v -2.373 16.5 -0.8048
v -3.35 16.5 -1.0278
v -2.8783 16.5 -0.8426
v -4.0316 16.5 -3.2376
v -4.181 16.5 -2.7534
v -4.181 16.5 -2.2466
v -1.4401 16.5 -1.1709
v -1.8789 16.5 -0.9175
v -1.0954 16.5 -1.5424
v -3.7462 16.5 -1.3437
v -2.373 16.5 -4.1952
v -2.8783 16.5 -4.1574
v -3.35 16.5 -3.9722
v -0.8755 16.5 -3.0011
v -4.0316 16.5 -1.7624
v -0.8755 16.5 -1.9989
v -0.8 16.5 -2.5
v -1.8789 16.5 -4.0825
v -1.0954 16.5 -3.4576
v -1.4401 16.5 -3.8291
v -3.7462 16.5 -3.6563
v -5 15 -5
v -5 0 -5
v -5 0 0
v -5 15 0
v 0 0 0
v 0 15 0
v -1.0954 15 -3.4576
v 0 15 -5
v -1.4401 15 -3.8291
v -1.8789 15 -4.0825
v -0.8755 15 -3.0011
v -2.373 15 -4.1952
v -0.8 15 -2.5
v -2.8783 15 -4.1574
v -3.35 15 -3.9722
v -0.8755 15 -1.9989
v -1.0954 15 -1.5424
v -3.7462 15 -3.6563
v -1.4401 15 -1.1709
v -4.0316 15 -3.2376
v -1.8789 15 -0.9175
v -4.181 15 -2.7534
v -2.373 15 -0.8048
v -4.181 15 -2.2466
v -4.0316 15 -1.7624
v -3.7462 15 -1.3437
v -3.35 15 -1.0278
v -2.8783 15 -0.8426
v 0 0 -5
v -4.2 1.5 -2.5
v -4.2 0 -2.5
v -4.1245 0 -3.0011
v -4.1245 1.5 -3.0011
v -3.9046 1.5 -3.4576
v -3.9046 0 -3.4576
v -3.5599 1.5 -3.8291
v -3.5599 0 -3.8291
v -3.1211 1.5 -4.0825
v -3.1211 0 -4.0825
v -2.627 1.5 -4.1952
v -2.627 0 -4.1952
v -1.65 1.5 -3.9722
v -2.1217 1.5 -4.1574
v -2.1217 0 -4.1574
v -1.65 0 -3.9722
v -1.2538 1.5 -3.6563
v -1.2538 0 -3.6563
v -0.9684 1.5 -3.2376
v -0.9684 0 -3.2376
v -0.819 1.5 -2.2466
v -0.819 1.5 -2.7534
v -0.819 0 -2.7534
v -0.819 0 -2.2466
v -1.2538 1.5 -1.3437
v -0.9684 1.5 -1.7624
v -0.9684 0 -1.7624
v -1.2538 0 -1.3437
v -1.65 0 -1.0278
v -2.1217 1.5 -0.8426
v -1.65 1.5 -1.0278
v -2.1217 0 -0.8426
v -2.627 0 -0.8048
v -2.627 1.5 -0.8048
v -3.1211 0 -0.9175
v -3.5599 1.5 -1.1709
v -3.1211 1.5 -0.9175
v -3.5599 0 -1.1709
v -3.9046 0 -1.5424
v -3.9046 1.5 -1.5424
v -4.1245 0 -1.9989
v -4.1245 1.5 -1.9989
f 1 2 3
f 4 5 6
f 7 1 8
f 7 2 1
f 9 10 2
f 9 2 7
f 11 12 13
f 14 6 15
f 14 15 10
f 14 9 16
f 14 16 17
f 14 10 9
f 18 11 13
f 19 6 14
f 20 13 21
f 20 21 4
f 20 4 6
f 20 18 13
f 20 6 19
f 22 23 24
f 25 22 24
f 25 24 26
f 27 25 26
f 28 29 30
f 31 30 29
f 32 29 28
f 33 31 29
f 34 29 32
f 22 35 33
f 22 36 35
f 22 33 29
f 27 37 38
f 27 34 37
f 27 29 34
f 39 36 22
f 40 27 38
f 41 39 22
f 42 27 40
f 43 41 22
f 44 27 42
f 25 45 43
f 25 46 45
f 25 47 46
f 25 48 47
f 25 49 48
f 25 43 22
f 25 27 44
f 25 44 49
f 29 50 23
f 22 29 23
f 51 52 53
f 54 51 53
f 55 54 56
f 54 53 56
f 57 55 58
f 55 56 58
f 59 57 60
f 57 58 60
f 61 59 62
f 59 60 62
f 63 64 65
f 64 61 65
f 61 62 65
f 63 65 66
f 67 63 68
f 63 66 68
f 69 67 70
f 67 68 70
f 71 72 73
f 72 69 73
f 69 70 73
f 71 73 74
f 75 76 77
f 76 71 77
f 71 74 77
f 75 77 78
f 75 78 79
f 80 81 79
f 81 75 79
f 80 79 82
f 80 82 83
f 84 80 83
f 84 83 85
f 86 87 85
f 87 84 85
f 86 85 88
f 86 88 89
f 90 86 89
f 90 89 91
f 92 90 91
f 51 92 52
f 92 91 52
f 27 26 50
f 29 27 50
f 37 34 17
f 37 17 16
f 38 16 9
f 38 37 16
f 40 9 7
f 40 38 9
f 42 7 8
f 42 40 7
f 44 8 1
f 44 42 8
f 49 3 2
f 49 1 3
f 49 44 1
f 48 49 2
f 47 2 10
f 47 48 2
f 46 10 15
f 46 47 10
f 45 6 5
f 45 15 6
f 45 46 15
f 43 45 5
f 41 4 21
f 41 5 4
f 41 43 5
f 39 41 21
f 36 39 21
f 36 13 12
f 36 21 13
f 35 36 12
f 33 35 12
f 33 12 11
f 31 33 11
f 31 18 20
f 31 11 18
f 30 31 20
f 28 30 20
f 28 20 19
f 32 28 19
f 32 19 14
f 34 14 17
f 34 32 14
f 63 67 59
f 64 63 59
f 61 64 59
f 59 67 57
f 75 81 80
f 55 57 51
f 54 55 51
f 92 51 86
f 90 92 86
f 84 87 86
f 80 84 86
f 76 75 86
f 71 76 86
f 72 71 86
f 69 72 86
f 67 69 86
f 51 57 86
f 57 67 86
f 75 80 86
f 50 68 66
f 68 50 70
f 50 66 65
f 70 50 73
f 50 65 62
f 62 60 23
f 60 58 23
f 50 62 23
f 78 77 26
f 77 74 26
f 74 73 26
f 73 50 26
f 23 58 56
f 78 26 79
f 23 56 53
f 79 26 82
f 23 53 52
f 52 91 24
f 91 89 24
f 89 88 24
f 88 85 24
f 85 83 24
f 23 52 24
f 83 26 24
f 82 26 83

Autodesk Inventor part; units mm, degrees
ref_plane "YZ Plane" through (0, 0, 0) normal (1, 0, 0) x (0, 1, 0)
ref_plane "XZ Plane" through (0, 0, 0) normal (0, 1, 0) x (-1, 0, 0)
ref_plane "XY Plane" through (0, 0, 0) normal (0, 0, 1) x (1, 0, 0)
sketch "草圖1" plane through (0, 0, 0) normal (0, 1, 0) x (-1, 0, 0)
  line L0 (5, 0) -> (0, 0)
  line L1 (0, 0) -> (0, -5)
  line L2 (0, -5) -> (5, -5)
  line L3 (5, -5) -> (5, 0)
  circle A0 centre (2.5, -2.5) radius 1.7
  point P0 (2.5, -5)
  point P1 (5, -2.5)
  dimension "d0" = 5
  dimension "d1" = 5
  dimension "d2" = 3.4
extrude "擠出1" add sketch "草圖1" along normal blind 15 contours L3 L2 L1 L0 | A0
extrude "擠出2" cut sketch "草圖1" along normal blind 1.5 contours A0
sketch "草圖2" plane through (0, 15, 0) normal (0, 1, 0) x (1, 0, 0)
  circle A0 centre (-2.5, 2.5) radius 1.7 projected
  point P0 (0, 0)
extrude "擠出3" add sketch "草圖2" along normal blind 1.5
sketch "草圖3" plane through (0, 0, 0) normal (1, 0, 0) x (0, 1, 0)
  line L0 (8.7779, 7.7621) -> (6.2221, 7.7621)
  line L1 (6.2221, 7.7621) -> (6.2221, -14.483)
  line L2 (6.2221, -14.483) -> (8.7779, -14.483)
  line L3 (8.7779, -14.483) -> (8.7779, 7.7621)
  line L4 (0, -5) -> (15, -5) projected
  point P0 (0, 0)
  point P1 (7.5, -14.483)
  point P2 (7.5, -5)
split_face "分割1"
properties part number "110033226_ipt_24_直條(3x1)"
